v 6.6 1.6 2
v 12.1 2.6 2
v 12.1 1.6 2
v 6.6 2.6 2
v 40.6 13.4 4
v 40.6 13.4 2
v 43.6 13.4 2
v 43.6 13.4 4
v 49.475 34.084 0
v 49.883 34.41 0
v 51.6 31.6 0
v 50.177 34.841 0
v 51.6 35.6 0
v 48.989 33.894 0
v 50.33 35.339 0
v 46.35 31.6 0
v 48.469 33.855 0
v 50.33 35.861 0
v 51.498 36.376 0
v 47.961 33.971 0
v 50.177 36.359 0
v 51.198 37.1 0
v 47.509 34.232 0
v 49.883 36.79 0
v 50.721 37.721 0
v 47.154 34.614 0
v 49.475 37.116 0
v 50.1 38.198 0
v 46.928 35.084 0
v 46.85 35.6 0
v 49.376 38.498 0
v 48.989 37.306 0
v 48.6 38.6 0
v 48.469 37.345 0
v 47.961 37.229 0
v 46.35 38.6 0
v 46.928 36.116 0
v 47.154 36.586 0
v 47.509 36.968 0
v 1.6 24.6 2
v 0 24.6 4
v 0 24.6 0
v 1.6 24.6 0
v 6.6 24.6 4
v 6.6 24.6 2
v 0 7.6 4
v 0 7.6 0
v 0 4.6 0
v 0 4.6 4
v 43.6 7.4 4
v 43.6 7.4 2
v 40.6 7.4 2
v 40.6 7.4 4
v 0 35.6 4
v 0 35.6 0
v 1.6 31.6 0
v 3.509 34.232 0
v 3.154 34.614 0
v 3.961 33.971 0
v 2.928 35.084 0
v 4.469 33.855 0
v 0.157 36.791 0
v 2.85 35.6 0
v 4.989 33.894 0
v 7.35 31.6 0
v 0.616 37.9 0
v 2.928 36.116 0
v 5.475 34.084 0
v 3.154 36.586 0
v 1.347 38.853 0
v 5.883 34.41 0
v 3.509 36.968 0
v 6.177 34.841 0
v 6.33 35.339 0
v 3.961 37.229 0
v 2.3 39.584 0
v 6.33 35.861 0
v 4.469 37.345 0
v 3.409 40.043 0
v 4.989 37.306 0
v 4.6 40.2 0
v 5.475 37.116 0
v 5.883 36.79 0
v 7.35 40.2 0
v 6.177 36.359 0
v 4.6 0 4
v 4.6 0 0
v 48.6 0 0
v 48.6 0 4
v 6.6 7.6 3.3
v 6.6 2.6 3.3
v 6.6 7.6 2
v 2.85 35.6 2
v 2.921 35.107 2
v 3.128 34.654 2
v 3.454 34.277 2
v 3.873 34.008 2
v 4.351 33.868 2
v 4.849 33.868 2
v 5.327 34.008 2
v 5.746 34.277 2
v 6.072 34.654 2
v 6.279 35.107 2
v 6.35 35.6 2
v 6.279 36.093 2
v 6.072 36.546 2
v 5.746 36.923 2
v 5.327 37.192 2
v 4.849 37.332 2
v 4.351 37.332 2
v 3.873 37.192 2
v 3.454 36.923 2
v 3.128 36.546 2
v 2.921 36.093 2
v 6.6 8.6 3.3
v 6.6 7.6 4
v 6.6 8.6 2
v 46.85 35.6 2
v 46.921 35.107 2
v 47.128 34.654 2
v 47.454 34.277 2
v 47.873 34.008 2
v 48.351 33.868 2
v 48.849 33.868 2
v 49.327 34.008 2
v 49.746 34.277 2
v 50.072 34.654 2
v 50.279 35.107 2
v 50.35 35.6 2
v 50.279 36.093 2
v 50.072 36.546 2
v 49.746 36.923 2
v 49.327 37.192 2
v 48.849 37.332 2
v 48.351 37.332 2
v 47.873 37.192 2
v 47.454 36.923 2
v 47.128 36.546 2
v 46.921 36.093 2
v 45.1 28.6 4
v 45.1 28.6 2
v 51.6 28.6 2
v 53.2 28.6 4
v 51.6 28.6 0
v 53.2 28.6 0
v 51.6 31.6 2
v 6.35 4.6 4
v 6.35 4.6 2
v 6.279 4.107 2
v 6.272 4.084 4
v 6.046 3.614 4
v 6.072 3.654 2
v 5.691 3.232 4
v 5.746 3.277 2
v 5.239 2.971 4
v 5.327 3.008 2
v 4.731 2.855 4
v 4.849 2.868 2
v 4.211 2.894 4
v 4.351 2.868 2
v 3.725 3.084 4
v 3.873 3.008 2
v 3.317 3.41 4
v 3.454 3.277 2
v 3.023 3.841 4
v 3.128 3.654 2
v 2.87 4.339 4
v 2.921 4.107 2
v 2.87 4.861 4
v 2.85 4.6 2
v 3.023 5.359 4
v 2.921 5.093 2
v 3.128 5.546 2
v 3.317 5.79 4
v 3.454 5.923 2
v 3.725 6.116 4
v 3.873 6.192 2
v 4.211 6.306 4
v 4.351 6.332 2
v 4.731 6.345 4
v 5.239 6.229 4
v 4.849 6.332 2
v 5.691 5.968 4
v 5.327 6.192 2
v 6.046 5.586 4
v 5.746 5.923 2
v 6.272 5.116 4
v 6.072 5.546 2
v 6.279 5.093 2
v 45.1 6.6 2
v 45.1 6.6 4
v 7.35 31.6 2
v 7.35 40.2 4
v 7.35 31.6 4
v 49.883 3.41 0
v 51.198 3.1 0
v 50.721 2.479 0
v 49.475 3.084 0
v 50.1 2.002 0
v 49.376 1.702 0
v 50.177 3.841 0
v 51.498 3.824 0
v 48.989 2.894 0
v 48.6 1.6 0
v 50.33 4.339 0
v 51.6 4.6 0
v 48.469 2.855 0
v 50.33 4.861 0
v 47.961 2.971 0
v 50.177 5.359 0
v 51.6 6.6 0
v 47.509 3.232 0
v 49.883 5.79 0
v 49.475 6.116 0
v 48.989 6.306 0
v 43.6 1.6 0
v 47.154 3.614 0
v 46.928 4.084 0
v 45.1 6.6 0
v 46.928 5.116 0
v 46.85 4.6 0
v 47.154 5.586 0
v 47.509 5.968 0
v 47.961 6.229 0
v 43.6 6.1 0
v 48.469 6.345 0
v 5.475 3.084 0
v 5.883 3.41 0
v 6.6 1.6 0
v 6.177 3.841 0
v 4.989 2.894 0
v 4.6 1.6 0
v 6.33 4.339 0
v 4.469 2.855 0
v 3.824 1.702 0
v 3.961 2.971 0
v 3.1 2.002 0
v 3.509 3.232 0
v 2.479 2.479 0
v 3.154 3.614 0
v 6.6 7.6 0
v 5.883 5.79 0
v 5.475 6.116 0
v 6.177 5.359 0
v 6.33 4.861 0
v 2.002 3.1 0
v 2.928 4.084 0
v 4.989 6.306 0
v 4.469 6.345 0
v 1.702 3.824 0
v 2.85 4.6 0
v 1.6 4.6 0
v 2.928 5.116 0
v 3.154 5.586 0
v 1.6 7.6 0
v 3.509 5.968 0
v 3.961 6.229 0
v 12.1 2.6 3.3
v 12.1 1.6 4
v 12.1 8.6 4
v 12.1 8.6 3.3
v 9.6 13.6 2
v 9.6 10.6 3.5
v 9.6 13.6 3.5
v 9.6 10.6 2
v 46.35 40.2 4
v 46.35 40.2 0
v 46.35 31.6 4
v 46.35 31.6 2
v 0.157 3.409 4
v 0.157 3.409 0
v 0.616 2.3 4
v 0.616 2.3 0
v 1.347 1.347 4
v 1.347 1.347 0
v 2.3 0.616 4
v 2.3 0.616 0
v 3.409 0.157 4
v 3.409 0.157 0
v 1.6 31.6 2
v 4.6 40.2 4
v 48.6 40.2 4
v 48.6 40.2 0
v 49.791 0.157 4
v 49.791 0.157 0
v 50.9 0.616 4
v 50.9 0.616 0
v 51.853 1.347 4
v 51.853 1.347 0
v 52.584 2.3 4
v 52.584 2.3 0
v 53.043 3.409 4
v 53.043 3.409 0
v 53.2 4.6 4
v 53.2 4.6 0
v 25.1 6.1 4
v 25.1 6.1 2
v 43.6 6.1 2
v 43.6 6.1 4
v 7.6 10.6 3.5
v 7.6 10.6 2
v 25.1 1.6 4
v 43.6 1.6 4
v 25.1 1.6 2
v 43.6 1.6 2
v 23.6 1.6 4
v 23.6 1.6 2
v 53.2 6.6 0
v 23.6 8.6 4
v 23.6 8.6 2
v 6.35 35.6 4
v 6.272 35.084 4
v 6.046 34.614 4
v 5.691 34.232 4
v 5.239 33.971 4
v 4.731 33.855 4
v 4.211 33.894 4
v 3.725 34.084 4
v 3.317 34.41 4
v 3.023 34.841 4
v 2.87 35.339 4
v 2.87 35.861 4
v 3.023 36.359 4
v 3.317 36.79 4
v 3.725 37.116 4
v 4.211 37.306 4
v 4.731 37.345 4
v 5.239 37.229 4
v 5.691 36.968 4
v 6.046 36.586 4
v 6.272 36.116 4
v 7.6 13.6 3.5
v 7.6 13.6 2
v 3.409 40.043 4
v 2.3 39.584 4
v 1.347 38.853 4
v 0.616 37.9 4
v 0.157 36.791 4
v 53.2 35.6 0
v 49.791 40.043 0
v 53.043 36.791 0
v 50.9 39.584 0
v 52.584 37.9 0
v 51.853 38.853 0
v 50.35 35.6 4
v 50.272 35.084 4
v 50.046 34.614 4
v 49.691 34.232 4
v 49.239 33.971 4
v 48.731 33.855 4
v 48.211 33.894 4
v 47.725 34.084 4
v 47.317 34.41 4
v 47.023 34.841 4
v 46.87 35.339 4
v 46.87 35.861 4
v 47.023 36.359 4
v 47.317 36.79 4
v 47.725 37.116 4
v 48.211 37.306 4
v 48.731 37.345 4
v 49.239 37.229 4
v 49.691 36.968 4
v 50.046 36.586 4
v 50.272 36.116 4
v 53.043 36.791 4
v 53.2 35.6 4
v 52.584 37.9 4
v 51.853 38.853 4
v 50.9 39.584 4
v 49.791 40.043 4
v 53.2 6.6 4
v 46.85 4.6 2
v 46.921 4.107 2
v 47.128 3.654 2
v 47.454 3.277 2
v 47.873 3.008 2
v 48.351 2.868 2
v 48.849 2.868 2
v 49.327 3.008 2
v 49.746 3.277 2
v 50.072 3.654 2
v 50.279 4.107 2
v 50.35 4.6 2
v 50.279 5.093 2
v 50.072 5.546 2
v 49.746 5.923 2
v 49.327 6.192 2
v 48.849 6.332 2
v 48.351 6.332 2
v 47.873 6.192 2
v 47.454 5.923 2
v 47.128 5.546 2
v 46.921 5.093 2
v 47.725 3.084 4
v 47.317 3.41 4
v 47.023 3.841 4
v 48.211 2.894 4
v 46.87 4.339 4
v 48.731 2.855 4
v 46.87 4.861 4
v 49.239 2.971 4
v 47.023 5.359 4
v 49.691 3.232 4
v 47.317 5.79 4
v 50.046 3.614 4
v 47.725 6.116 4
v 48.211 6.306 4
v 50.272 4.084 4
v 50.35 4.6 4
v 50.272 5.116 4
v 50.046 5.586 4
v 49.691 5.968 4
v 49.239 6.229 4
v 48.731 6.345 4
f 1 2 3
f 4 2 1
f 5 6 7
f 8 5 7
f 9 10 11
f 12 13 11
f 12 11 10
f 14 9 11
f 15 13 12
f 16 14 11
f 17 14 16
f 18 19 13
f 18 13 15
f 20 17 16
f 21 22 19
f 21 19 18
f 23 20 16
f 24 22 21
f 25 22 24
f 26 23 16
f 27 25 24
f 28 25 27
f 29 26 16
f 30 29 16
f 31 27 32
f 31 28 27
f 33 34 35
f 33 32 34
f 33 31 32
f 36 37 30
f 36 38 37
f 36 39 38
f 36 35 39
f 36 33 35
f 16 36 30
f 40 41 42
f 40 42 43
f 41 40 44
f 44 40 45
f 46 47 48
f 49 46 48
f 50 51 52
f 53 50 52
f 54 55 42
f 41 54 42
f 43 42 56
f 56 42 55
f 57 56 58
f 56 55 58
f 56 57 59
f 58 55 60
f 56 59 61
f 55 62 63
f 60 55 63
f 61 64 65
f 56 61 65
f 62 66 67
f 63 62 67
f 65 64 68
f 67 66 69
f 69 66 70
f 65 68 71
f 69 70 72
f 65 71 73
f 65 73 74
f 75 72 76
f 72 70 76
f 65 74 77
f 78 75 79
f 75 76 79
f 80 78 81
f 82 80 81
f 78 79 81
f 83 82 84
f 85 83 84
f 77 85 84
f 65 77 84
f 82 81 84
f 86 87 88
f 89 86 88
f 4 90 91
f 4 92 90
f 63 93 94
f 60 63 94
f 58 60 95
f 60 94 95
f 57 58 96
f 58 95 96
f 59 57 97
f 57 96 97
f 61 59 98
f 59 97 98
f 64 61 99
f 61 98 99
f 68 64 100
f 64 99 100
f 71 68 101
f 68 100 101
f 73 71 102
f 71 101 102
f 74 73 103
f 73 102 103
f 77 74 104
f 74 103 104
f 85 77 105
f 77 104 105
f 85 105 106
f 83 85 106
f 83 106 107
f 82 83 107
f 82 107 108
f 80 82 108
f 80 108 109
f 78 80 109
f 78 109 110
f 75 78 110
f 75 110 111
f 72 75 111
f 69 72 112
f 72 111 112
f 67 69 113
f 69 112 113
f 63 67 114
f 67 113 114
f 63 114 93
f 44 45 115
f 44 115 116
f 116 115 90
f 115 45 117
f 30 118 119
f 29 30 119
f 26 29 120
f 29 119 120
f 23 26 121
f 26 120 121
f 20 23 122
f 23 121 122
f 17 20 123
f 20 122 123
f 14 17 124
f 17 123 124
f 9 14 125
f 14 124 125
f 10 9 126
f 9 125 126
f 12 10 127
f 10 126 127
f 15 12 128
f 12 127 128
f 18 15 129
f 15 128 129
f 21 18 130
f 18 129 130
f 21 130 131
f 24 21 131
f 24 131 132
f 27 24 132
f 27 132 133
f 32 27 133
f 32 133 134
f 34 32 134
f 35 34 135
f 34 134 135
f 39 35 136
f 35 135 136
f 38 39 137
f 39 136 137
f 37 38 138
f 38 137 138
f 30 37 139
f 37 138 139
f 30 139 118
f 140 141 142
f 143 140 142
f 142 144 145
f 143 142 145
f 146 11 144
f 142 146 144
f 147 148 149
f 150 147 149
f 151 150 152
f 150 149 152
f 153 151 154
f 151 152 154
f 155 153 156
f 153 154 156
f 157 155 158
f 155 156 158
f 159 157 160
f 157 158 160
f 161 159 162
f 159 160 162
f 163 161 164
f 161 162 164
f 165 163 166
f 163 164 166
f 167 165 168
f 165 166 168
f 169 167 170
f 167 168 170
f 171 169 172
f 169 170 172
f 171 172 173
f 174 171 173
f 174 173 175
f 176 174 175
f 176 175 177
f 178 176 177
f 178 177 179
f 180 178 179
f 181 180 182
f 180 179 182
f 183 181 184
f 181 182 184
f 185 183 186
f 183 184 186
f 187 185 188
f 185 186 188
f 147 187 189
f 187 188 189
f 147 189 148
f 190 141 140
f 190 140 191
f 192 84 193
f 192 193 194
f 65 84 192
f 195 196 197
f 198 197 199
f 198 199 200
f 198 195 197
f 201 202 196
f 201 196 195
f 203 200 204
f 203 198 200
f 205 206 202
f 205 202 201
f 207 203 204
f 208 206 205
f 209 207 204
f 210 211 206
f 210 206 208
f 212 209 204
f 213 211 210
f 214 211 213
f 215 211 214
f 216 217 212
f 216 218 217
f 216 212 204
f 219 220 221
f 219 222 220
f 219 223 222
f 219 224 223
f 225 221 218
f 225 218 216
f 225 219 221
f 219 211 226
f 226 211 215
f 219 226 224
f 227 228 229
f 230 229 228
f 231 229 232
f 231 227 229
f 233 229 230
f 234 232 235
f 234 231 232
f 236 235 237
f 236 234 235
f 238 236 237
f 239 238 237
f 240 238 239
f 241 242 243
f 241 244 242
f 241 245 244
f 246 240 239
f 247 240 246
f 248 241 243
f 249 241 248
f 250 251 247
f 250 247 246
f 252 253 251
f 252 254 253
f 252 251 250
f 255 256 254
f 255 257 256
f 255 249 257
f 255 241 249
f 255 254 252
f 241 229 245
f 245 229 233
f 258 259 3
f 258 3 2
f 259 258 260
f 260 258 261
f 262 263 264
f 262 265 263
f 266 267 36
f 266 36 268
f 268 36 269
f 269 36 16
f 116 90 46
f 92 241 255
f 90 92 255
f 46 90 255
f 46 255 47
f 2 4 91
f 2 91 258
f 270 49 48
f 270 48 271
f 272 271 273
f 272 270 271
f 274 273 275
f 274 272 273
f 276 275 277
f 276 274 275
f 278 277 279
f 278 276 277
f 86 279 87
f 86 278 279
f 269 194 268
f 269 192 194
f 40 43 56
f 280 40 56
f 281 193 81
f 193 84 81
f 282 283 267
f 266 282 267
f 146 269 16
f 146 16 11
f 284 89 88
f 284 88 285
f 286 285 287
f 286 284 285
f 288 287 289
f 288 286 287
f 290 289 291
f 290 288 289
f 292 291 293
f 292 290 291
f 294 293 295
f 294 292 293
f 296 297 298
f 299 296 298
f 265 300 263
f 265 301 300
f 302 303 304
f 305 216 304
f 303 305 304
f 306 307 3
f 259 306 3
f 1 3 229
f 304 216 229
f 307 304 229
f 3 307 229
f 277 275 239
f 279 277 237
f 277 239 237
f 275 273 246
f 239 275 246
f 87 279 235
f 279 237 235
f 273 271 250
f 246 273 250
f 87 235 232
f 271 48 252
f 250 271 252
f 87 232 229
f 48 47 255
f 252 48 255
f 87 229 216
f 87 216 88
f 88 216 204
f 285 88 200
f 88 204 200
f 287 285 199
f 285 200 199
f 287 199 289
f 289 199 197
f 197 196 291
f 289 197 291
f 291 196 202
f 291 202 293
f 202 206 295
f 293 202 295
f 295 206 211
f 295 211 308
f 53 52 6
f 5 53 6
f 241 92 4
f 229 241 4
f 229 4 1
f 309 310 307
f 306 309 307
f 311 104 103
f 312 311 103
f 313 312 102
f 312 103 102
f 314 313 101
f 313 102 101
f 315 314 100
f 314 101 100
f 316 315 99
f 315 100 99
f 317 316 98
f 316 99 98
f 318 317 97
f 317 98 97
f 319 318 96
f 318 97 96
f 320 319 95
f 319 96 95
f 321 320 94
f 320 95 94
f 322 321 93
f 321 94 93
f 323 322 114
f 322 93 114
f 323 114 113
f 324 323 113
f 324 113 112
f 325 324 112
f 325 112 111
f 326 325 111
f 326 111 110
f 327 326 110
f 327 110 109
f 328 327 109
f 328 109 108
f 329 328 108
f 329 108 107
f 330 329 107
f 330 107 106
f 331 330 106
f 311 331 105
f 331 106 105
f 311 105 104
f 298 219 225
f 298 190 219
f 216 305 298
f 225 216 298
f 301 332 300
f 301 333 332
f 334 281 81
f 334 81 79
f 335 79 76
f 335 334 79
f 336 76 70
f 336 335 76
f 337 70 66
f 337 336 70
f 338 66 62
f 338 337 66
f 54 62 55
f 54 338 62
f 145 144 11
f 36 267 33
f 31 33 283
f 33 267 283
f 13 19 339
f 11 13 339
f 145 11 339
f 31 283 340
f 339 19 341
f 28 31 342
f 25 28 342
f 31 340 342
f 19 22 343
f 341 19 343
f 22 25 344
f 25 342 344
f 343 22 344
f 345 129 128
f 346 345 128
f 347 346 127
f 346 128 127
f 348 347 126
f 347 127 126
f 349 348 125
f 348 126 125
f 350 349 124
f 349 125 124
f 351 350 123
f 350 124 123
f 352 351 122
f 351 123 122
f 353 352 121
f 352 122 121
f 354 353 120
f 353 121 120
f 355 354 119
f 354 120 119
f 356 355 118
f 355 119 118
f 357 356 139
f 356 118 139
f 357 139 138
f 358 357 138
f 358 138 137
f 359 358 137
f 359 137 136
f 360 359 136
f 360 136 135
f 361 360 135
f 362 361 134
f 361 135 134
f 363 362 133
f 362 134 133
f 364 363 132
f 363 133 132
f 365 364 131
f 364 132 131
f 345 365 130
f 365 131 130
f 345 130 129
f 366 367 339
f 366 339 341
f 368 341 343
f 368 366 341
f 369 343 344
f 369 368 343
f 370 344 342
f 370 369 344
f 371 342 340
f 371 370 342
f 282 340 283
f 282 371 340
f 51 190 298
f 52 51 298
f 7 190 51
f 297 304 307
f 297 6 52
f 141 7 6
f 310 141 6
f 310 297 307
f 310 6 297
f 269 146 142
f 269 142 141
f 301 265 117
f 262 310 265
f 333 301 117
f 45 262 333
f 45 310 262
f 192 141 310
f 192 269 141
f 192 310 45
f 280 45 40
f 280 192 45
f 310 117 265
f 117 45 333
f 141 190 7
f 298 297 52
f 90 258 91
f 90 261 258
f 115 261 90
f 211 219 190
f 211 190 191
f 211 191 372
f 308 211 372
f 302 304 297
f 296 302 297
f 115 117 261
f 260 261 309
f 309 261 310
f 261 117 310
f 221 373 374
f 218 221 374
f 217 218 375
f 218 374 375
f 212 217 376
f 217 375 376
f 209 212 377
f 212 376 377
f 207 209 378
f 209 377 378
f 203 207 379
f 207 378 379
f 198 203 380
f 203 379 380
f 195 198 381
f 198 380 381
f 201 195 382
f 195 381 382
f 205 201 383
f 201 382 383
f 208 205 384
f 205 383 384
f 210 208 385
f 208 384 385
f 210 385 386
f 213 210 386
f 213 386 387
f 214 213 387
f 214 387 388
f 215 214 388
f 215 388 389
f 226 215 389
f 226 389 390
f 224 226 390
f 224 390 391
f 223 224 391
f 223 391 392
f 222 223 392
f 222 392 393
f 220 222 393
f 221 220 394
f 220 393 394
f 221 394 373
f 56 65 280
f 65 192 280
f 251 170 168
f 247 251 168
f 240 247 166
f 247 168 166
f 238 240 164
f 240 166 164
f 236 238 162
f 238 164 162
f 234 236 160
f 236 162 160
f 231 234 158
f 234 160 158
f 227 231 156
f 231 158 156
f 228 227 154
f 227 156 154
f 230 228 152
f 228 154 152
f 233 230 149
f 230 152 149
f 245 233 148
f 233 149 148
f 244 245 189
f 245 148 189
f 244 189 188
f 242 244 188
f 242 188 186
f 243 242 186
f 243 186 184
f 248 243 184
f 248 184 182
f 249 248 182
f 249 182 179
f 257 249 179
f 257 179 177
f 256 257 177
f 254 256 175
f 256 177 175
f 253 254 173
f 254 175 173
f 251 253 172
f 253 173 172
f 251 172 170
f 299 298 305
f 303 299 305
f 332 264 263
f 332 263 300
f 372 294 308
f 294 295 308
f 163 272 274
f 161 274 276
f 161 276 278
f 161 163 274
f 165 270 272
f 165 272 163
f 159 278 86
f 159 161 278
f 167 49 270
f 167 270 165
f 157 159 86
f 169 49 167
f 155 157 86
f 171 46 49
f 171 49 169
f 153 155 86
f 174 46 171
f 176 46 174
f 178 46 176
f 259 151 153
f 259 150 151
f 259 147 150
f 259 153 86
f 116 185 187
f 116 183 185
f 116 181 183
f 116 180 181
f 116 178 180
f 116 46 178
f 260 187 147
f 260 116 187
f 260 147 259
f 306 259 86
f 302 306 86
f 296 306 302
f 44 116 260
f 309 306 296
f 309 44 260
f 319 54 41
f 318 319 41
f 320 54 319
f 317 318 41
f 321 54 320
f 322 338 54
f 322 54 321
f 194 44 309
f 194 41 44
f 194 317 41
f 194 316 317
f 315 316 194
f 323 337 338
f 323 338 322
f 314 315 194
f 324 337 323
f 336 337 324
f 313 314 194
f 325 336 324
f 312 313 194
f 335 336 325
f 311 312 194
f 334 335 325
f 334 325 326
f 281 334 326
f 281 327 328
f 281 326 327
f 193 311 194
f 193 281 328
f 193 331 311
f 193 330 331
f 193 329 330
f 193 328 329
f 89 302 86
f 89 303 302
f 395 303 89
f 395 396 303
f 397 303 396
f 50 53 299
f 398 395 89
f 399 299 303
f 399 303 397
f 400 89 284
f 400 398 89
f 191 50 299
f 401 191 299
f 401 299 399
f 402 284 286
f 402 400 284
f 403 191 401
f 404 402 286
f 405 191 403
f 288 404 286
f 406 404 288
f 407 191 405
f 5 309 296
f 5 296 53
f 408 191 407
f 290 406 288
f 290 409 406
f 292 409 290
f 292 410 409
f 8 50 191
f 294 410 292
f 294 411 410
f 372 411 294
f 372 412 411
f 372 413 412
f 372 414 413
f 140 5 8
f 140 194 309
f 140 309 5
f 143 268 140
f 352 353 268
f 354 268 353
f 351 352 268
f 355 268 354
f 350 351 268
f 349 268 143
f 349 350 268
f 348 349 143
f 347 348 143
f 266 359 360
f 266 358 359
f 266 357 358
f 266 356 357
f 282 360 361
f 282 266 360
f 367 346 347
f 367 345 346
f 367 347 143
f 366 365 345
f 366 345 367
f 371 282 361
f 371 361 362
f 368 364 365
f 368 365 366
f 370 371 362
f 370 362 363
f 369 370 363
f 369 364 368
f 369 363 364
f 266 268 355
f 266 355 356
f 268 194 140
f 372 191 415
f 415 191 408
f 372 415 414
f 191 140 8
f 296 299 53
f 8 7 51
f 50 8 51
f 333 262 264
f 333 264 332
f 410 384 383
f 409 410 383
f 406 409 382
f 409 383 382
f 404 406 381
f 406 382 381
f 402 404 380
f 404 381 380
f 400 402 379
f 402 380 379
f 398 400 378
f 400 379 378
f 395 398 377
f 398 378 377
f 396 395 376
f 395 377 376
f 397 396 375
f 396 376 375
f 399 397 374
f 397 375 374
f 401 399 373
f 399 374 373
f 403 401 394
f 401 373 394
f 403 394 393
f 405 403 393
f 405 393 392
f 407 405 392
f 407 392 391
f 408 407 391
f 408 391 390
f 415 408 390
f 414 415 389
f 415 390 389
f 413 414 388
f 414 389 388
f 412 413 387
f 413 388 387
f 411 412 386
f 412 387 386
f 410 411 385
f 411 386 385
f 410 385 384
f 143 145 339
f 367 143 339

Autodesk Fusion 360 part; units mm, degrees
sketch "Sketch1" plane through (0, 0, 0) normal (0, 0, 1) x (1, 0, 0)
  line L0 (0, 0) -> (53.2, 0)
  line L1 (53.2, 0) -> (53.2, 40.2)
  line L2 (53.2, 40.2) -> (0, 40.2)
  line L3 (0, 40.2) -> (0, 0)
  circle A0 centre (4.6, 4.6) radius 1.75
  circle A1 centre (4.6, 35.6) radius 1.75
  circle A2 centre (48.6, 35.6) radius 1.75
  circle A3 centre (48.6, 4.6) radius 1.75
  dimension "d1" = 53.2
  dimension "d2" = 40.2
  dimension "d3" = 4.6
  dimension "d4" = 4.6
  dimension "d5" = 4.6
  dimension "d6" = 4.6
  dimension "d7" = 4.6
  dimension "d8" = 4.6
  dimension "d9" = 4.6
  dimension "d10" = 4.6
  dimension "d11" = 3.5
  dimension "d12" = 3.5
  dimension "d13" = 3.5
  dimension "d14" = 3.5
extrude "Extrude1" add sketch "Sketch1" along normal blind 4
fillet "Fillet1" radius 4.6 4 edges at (0, 40.2, 2) (0, 0, 2) (53.2, 0, 2) (53.2, 40.2, 2)
sketch "Sketch2" plane through (0, 0, 0) normal (0, 0, -1) x (-1, 0, 0)
  arc A0 (-48.6, 40.2) -> (-53.2, 35.6) centre (-48.6, 35.6) ccw
  line L0 (-53.2, 35.6) -> (-53.2, 4.6)
  arc A1 (-53.2, 4.6) -> (-48.6, 0) centre (-48.6, 4.6) ccw
  line L1 (-48.6, 0) -> (-4.6, 0)
  arc A2 (-4.6, 0) -> (0, 4.6) centre (-4.6, 4.6) ccw
  line L2 (0, 4.6) -> (0, 35.6)
  arc A3 (0, 35.6) -> (-4.6, 40.2) centre (-4.6, 35.6) ccw
  line L3 (-4.6, 40.2) -> (-48.6, 40.2)
  circle A4 centre (-48.6, 4.6) radius 1.75
  circle A5 centre (-48.6, 35.6) radius 1.75
  circle A6 centre (-4.6, 4.6) radius 1.75
  circle A7 centre (-4.6, 35.6) radius 1.75
  line L4 (-51.6, 35.6) -> (-51.6, 4.6)
  arc A8 (-51.6, 4.6) -> (-48.6, 1.6) centre (-48.6, 4.6) ccw
  line L5 (-48.6, 1.6) -> (-4.6, 1.6)
  arc A9 (-4.6, 1.6) -> (-1.6, 4.6) centre (-4.6, 4.6) ccw
  line L6 (-1.6, 4.6) -> (-1.6, 35.6)
  arc A10 (-1.6, 35.6) -> (-4.6, 38.6) centre (-4.6, 35.6) ccw
  line L7 (-4.6, 38.6) -> (-48.6, 38.6)
  arc A11 (-48.6, 38.6) -> (-51.6, 35.6) centre (-48.6, 35.6) ccw
  dimension "d18" = 1.6
extrude "Extrude2" cut sketch "Sketch2" against normal blind 2 contours L4 A8 L5 A9 L6 A10 L7 A11
sketch "Sketch3" plane through (0, 0, 0) normal (0, 0, -1) x (-1, 0, 0)
  line L0 (-51.6, 4.6) -> (-51.6, 35.6)
  arc A0 (-48.6, 38.6) -> (-51.6, 35.6) centre (-48.6, 35.6) ccw
  line L1 (-48.6, 38.6) -> (-4.6, 38.6)
  arc A1 (-1.6, 35.6) -> (-4.6, 38.6) centre (-4.6, 35.6) ccw
  line L2 (-1.6, 35.6) -> (-1.6, 4.6)
  arc A2 (-4.6, 1.6) -> (-1.6, 4.6) centre (-4.6, 4.6) ccw
  line L3 (-4.6, 1.6) -> (-48.6, 1.6)
  arc A3 (-51.6, 4.6) -> (-48.6, 1.6) centre (-48.6, 4.6) ccw
  arc A4 (-48.6, 40.2) -> (-53.2, 35.6) centre (-48.6, 35.6) ccw
  line L4 (-53.2, 35.6) -> (-53.2, 4.6)
  arc A5 (-53.2, 4.6) -> (-48.6, 0) centre (-48.6, 4.6) ccw
  line L5 (-48.6, 0) -> (-4.6, 0)
  arc A6 (-4.6, 0) -> (0, 4.6) centre (-4.6, 4.6) ccw
  line L6 (0, 4.6) -> (0, 35.6)
  arc A7 (0, 35.6) -> (-4.6, 40.2) centre (-4.6, 35.6) ccw
  line L7 (-4.6, 40.2) -> (-48.6, 40.2)
  line L8 (0, 24.6) -> (-1.6, 24.6)
  line L9 (0, 7.6) -> (-1.6, 7.6)
  line L10 (-53.2, 28.6) -> (-51.6, 28.6)
  line L11 (-53.2, 6.6) -> (-51.6, 6.6)
  line L12 (-46.35, 40.2) -> (-46.35, 38.6)
  line L13 (-7.35, 40.2) -> (-7.35, 38.6)
  dimension "d21" = 17
  dimension "d22" = 11
  dimension "d25" = 5
  dimension "d26" = 10
  dimension "d27" = 5.75
  dimension "d73" = 39
extrude "Extrude3" cut sketch "Sketch3" against normal blind 2 contours L0 L4 L10 L11 | L2 L6 L8 L9 | L1 L7 L12 L13
sketch "Sketch4" plane through (0, 0, 2) normal (0, 0, -1) x (-1, 0, 0)
  circle A0 centre (-48.6, 4.6) radius 1.75
  circle A1 centre (-4.6, 35.6) radius 1.75
  circle A2 centre (-4.6, 4.6) radius 1.75
  circle A3 centre (-48.6, 35.6) radius 1.75
  line L0 (-53.2, 28.6) -> (-53.2, 6.6)
  line L1 (0, 7.6) -> (0, 24.6)
  line L2 (-7.35, 40.2) -> (-46.35, 40.2)
  arc A4 (-48.6, 38.6) -> (-51.6, 35.6) centre (-48.6, 35.6) ccw
  line L3 (-51.6, 35.6) -> (-51.6, 28.6)
  line L4 (-51.6, 28.6) -> (-53.2, 28.6)
  line L5 (-53.2, 6.6) -> (-51.6, 6.6)
  line L6 (-51.6, 6.6) -> (-51.6, 4.6)
  arc A5 (-51.6, 4.6) -> (-48.6, 1.6) centre (-48.6, 4.6) ccw
  line L7 (-48.6, 1.6) -> (-4.6, 1.6)
  arc A6 (-4.6, 1.6) -> (-1.6, 4.6) centre (-4.6, 4.6) ccw
  line L8 (-1.6, 4.6) -> (-1.6, 7.6)
  line L9 (-1.6, 7.6) -> (0, 7.6)
  line L10 (0, 24.6) -> (-1.6, 24.6)
  line L11 (-1.6, 24.6) -> (-1.6, 35.6)
  arc A7 (-1.6, 35.6) -> (-4.6, 38.6) centre (-4.6, 35.6) ccw
  line L12 (-4.6, 38.6) -> (-7.35, 38.6)
  line L13 (-7.35, 38.6) -> (-7.35, 40.2)
  line L14 (-46.35, 40.2) -> (-46.35, 38.6)
  line L15 (-46.35, 38.6) -> (-48.6, 38.6)
  line L16 (-51.6, 28.6) -> (-45.1, 28.6)
  line L17 (-45.1, 28.6) -> (-45.1, 6.6)
  line L18 (-45.1, 6.6) -> (-51.6, 6.6)
  line L19 (-7.35, 38.6) -> (-7.35, 31.6)
  line L20 (-7.35, 31.6) -> (-46.35, 31.6)
  line L21 (-46.35, 31.6) -> (-46.35, 38.6)
  line L22 (-1.6, 24.6) -> (-6.6, 24.6)
  line L23 (-6.6, 24.6) -> (-6.6, 7.6)
  line L24 (-6.6, 7.6) -> (-1.6, 7.6)
  line L25 (-12.1, 1.6) -> (-12.1, 8.6)
  line L26 (-12.1, 8.6) -> (-23.6, 8.6)
  line L27 (-23.6, 8.6) -> (-23.6, 1.6)
  line L28 (-25.1, 1.6) -> (-25.1, 6.1)
  line L29 (-25.1, 6.1) -> (-43.6, 6.1)
  line L30 (-43.6, 6.1) -> (-43.6, 1.6)
  dimension "d74" = 6.5
  dimension "d75" = 7
  dimension "d76" = 5
  dimension "d77" = 10.5
  dimension "d78" = 11.5
  dimension "d79" = 7
  dimension "d80" = 4.5
  dimension "d81" = 23.5
  dimension "d82" = 18.5
extrude "Extrude4" cut sketch "Sketch4" against normal blind 2 contours L0 L4 L5 L16 L17 L18 | L2 L13 L14 L19 L20 L21 | L7 L28 L29 L30 | L7 L25 L26 L27 | L1 L9 L10 L22 L23 L24
sketch "Sketch5" plane through (0, 0, 2) normal (0, 0, -1) x (-1, 0, 0)
  line L0 (-51.6, 35.6) -> (-51.6, 28.6)
  line L1 (-48.6, 1.6) -> (-43.6, 1.6)
  line L2 (-1.6, 7.6) -> (-6.6, 7.6)
  line L3 (-6.6, 24.6) -> (-1.6, 24.6)
  line L4 (-7.35, 38.6) -> (-7.35, 31.6)
  line L5 (-4.6, 38.6) -> (-7.35, 38.6)
  line L6 (-46.35, 31.6) -> (-46.35, 38.6)
  line L7 (-51.6, 28.6) -> (-45.1, 28.6)
  line L8 (-45.1, 6.6) -> (-51.6, 6.6)
  circle A0 centre (-48.6, 35.6) radius 1.75
  circle A1 centre (-4.6, 4.6) radius 1.75
  circle A2 centre (-4.6, 35.6) radius 1.75
  circle A3 centre (-48.6, 4.6) radius 1.75
  line L9 (-12.6, 8.6) -> (-6.6, 8.6)
  line L10 (-6.6, 8.6) -> (-6.6, 2.6)
  line L11 (-6.6, 2.6) -> (-12.6, 2.6)
  line L12 (-12.6, 2.6) -> (-12.6, 8.6)
  arc A4 (-4.6, 1.6) -> (-1.6, 4.6) centre (-4.6, 4.6) ccw
  line L13 (-1.6, 4.6) -> (-1.6, 7.6)
  line L14 (-1.6, 24.6) -> (-1.6, 35.6)
  arc A5 (-1.6, 35.6) -> (-4.6, 38.6) centre (-4.6, 35.6) ccw
  line L15 (-46.35, 38.6) -> (-48.6, 38.6)
  arc A6 (-48.6, 38.6) -> (-51.6, 35.6) centre (-48.6, 35.6) ccw
  line L16 (-51.6, 6.6) -> (-51.6, 4.6)
  arc A7 (-51.6, 4.6) -> (-48.6, 1.6) centre (-48.6, 4.6) ccw
  line L17 (-45.1, 28.6) -> (-45.1, 6.6)
  line L18 (-43.6, 1.6) -> (-43.6, 6.1)
  line L19 (-43.6, 6.1) -> (-25.1, 6.1)
  line L20 (-25.1, 6.1) -> (-25.1, 1.6)
  line L21 (-25.1, 1.6) -> (-23.6, 1.6)
  line L22 (-23.6, 1.6) -> (-23.6, 8.6)
  line L23 (-23.6, 8.6) -> (-12.1, 8.6)
  line L24 (-12.1, 8.6) -> (-12.1, 1.6)
  line L25 (-12.1, 1.6) -> (-4.6, 1.6)
  line L26 (-6.6, 7.6) -> (-6.6, 24.6)
  line L27 (-7.35, 31.6) -> (-46.35, 31.6)
  dimension "d49" = 6
  dimension "d51" = 6
  dimension "d83" = 1
  dimension "d84" = 5
extrude "Extrude5" cut sketch "Sketch5" against normal blind 1.3 contours L9 L10 L11 L24 L26 | L9 L11 L12 L23 L24
sketch "Sketch8" plane through (0, 0, 2) normal (0, 0, -1) x (-1, 0, 0)
  line L0 (-6.6, 24.6) -> (-1.6, 24.6)
  line L1 (-7.35, 38.6) -> (-7.35, 31.6)
  line L2 (-4.6, 38.6) -> (-7.35, 38.6)
  line L3 (-46.35, 31.6) -> (-46.35, 38.6)
  line L4 (-51.6, 28.6) -> (-45.1, 28.6)
  line L5 (-45.1, 6.6) -> (-51.6, 6.6)
  line L6 (-51.6, 35.6) -> (-51.6, 28.6)
  line L7 (-48.6, 1.6) -> (-43.6, 1.6)
  line L8 (-23.6, 8.6) -> (-6.6, 8.6)
  circle A0 centre (-48.6, 35.6) radius 1.75
  circle A1 centre (-4.6, 35.6) radius 1.75
  circle A2 centre (-48.6, 4.6) radius 1.75
  arc A3 (-1.6, 35.6) -> (-4.6, 38.6) centre (-4.6, 35.6) ccw
  line L9 (-46.35, 38.6) -> (-48.6, 38.6)
  arc A4 (-48.6, 38.6) -> (-51.6, 35.6) centre (-48.6, 35.6) ccw
  line L10 (-51.6, 6.6) -> (-51.6, 4.6)
  arc A5 (-51.6, 4.6) -> (-48.6, 1.6) centre (-48.6, 4.6) ccw
  line L11 (-6.6, 8.6) -> (-6.6, 24.6)
  line L12 (-7.35, 31.6) -> (-46.35, 31.6)
  line L13 (-45.1, 28.6) -> (-45.1, 6.6)
  line L14 (-43.6, 1.6) -> (-43.6, 6.1)
  line L15 (-43.6, 6.1) -> (-25.1, 6.1)
  line L16 (-25.1, 6.1) -> (-25.1, 1.6)
  line L17 (-25.1, 1.6) -> (-23.6, 1.6)
  line L18 (-23.6, 1.6) -> (-23.6, 8.6)
  line L19 (-1.6, 24.6) -> (-1.6, 35.6)
  line L20 (-45.1, 6.6) -> (-43.6, 6.1)
  line L21 (-7.35, 31.6) -> (-1.6, 31.6)
  line L22 (-46.35, 31.6) -> (-46.6643, 31.6)
  line L23 (-46.6643, 31.6) -> (-51.6, 31.6)
  line L24 (-6.6, 7.6) -> (-6.6, 2.6)
  line L25 (-6.6, 2.6) -> (-12.1, 2.6)
  line L26 (-12.1, 2.6) -> (-12.1, 1.6)
  line L27 (-12.1, 1.6) -> (-4.6, 1.6)
  arc A6 (-4.6, 1.6) -> (-1.6, 4.6) centre (-4.6, 4.6) ccw
  line L28 (-1.6, 4.6) -> (-1.6, 7.6)
  line L29 (-1.6, 7.6) -> (-6.6, 7.6)
  circle A7 centre (-4.6, 4.6) radius 1.75
  line L30 (-6.6, 2.6) -> (-6.6, 1.6)
extrude "Extrude8" add sketch "Sketch8" along normal blind 2 contours L1 L2 A3 L19 L21 | L3 L6 L9 A4 L22 L23 | L5 L7 L10 A5 L14 L20 | L24 L27 A6 L28 L29 L30
sketch "Sketch9" plane through (0, 0, 2) normal (0, 0, -1) x (-1, 0, 0)
  line L0 (-45.1, 6.6) -> (-43.6, 6.1)
  line L1 (-43.6, 6.1) -> (-25.1, 6.1)
  line L2 (-25.1, 6.1) -> (-25.1, 1.6)
  line L3 (-25.1, 1.6) -> (-23.6, 1.6)
  line L4 (-23.6, 1.6) -> (-23.6, 8.6)
  line L5 (-23.6, 8.6) -> (-6.6, 8.6)
  line L6 (-6.6, 8.6) -> (-6.6, 24.6)
  line L7 (-6.6, 24.6) -> (-1.6, 24.6)
  line L8 (-1.6, 24.6) -> (-1.6, 31.6)
  line L9 (-1.6, 31.6) -> (-7.35, 31.6)
  line L10 (-7.35, 31.6) -> (-46.35, 31.6)
  line L11 (-46.35, 31.6) -> (-51.6, 31.6)
  line L12 (-51.6, 31.6) -> (-51.6, 28.6)
  line L13 (-51.6, 28.6) -> (-45.1, 28.6)
  line L14 (-45.1, 28.6) -> (-45.1, 6.6)
  line L15 (-7.6, 10.6) -> (-9.6, 10.6)
  line L16 (-9.6, 10.6) -> (-9.6, 13.6)
  line L17 (-9.6, 13.6) -> (-7.6, 13.6)
  line L18 (-7.6, 13.6) -> (-7.6, 10.6)
  dimension "d85" = 2
  dimension "d86" = 1
  dimension "d87" = 3
  dimension "d88" = 2
extrude "Extrude9" cut sketch "Sketch9" against normal blind 1.5 contours L15 L16 L17 L18
sketch "Sketch10" plane through (0, 0, 2) normal (0, 0, -1) x (-1, 0, 0)
  line L0 (-9.6, 10.6) -> (-9.6, 13.6)
  line L1 (-9.6, 13.6) -> (-7.6, 13.6)
  line L2 (-7.6, 13.6) -> (-7.6, 10.6)
  line L3 (-7.6, 10.6) -> (-9.6, 10.6)
  line L4 (-45.1, 6.6) -> (-43.6, 6.1)
  line L5 (-43.6, 6.1) -> (-25.1, 6.1)
  line L6 (-25.1, 6.1) -> (-25.1, 1.6)
  line L7 (-25.1, 1.6) -> (-23.6, 1.6)
  line L8 (-23.6, 1.6) -> (-23.6, 8.6)
  line L9 (-23.6, 8.6) -> (-6.6, 8.6)
  line L10 (-6.6, 8.6) -> (-6.6, 24.6)
  line L11 (-6.6, 24.6) -> (-1.6, 24.6)
  line L12 (-1.6, 24.6) -> (-1.6, 31.6)
  line L13 (-1.6, 31.6) -> (-7.35, 31.6)
  line L14 (-7.35, 31.6) -> (-46.35, 31.6)
  line L15 (-46.35, 31.6) -> (-51.6, 31.6)
  line L16 (-51.6, 31.6) -> (-51.6, 28.6)
  line L17 (-51.6, 28.6) -> (-45.1, 28.6)
  line L18 (-45.1, 28.6) -> (-45.1, 6.6)
  line L19 (-43.6, 7.4) -> (-40.6, 7.4)
  line L20 (-40.6, 7.4) -> (-40.6, 13.4)
  line L21 (-40.6, 13.4) -> (-43.6, 13.4)
  line L22 (-43.6, 13.4) -> (-43.6, 7.4)
  line L23 (-6.6, 1.6) -> (-43.6, 1.6)
  dimension "d91" = 6
  dimension "d92" = 3
  dimension "d93" = 8
  dimension "d94" = 5.8
extrude "Extrude10" cut sketch "Sketch10" against normal blind 2 contours L19 L20 L21 L22
equation "d1 = 50 mm + ( ( 2 * 1.6 ) * 1 mm )"
equation "d2 = 37 mm + ( ( 2 * 1.6 ) * 1 mm )"
equation "d3 = 3 mm + 1.6 mm"
equation "d4 = d3"
equation "d5 = d4"
equation "d6 = d3"
equation "d7 = d3"
equation "d8 = d7"
equation "d9 = d4"
equation "d10 = d5"
equation "d17 = 3 mm + 1.6 mm"
